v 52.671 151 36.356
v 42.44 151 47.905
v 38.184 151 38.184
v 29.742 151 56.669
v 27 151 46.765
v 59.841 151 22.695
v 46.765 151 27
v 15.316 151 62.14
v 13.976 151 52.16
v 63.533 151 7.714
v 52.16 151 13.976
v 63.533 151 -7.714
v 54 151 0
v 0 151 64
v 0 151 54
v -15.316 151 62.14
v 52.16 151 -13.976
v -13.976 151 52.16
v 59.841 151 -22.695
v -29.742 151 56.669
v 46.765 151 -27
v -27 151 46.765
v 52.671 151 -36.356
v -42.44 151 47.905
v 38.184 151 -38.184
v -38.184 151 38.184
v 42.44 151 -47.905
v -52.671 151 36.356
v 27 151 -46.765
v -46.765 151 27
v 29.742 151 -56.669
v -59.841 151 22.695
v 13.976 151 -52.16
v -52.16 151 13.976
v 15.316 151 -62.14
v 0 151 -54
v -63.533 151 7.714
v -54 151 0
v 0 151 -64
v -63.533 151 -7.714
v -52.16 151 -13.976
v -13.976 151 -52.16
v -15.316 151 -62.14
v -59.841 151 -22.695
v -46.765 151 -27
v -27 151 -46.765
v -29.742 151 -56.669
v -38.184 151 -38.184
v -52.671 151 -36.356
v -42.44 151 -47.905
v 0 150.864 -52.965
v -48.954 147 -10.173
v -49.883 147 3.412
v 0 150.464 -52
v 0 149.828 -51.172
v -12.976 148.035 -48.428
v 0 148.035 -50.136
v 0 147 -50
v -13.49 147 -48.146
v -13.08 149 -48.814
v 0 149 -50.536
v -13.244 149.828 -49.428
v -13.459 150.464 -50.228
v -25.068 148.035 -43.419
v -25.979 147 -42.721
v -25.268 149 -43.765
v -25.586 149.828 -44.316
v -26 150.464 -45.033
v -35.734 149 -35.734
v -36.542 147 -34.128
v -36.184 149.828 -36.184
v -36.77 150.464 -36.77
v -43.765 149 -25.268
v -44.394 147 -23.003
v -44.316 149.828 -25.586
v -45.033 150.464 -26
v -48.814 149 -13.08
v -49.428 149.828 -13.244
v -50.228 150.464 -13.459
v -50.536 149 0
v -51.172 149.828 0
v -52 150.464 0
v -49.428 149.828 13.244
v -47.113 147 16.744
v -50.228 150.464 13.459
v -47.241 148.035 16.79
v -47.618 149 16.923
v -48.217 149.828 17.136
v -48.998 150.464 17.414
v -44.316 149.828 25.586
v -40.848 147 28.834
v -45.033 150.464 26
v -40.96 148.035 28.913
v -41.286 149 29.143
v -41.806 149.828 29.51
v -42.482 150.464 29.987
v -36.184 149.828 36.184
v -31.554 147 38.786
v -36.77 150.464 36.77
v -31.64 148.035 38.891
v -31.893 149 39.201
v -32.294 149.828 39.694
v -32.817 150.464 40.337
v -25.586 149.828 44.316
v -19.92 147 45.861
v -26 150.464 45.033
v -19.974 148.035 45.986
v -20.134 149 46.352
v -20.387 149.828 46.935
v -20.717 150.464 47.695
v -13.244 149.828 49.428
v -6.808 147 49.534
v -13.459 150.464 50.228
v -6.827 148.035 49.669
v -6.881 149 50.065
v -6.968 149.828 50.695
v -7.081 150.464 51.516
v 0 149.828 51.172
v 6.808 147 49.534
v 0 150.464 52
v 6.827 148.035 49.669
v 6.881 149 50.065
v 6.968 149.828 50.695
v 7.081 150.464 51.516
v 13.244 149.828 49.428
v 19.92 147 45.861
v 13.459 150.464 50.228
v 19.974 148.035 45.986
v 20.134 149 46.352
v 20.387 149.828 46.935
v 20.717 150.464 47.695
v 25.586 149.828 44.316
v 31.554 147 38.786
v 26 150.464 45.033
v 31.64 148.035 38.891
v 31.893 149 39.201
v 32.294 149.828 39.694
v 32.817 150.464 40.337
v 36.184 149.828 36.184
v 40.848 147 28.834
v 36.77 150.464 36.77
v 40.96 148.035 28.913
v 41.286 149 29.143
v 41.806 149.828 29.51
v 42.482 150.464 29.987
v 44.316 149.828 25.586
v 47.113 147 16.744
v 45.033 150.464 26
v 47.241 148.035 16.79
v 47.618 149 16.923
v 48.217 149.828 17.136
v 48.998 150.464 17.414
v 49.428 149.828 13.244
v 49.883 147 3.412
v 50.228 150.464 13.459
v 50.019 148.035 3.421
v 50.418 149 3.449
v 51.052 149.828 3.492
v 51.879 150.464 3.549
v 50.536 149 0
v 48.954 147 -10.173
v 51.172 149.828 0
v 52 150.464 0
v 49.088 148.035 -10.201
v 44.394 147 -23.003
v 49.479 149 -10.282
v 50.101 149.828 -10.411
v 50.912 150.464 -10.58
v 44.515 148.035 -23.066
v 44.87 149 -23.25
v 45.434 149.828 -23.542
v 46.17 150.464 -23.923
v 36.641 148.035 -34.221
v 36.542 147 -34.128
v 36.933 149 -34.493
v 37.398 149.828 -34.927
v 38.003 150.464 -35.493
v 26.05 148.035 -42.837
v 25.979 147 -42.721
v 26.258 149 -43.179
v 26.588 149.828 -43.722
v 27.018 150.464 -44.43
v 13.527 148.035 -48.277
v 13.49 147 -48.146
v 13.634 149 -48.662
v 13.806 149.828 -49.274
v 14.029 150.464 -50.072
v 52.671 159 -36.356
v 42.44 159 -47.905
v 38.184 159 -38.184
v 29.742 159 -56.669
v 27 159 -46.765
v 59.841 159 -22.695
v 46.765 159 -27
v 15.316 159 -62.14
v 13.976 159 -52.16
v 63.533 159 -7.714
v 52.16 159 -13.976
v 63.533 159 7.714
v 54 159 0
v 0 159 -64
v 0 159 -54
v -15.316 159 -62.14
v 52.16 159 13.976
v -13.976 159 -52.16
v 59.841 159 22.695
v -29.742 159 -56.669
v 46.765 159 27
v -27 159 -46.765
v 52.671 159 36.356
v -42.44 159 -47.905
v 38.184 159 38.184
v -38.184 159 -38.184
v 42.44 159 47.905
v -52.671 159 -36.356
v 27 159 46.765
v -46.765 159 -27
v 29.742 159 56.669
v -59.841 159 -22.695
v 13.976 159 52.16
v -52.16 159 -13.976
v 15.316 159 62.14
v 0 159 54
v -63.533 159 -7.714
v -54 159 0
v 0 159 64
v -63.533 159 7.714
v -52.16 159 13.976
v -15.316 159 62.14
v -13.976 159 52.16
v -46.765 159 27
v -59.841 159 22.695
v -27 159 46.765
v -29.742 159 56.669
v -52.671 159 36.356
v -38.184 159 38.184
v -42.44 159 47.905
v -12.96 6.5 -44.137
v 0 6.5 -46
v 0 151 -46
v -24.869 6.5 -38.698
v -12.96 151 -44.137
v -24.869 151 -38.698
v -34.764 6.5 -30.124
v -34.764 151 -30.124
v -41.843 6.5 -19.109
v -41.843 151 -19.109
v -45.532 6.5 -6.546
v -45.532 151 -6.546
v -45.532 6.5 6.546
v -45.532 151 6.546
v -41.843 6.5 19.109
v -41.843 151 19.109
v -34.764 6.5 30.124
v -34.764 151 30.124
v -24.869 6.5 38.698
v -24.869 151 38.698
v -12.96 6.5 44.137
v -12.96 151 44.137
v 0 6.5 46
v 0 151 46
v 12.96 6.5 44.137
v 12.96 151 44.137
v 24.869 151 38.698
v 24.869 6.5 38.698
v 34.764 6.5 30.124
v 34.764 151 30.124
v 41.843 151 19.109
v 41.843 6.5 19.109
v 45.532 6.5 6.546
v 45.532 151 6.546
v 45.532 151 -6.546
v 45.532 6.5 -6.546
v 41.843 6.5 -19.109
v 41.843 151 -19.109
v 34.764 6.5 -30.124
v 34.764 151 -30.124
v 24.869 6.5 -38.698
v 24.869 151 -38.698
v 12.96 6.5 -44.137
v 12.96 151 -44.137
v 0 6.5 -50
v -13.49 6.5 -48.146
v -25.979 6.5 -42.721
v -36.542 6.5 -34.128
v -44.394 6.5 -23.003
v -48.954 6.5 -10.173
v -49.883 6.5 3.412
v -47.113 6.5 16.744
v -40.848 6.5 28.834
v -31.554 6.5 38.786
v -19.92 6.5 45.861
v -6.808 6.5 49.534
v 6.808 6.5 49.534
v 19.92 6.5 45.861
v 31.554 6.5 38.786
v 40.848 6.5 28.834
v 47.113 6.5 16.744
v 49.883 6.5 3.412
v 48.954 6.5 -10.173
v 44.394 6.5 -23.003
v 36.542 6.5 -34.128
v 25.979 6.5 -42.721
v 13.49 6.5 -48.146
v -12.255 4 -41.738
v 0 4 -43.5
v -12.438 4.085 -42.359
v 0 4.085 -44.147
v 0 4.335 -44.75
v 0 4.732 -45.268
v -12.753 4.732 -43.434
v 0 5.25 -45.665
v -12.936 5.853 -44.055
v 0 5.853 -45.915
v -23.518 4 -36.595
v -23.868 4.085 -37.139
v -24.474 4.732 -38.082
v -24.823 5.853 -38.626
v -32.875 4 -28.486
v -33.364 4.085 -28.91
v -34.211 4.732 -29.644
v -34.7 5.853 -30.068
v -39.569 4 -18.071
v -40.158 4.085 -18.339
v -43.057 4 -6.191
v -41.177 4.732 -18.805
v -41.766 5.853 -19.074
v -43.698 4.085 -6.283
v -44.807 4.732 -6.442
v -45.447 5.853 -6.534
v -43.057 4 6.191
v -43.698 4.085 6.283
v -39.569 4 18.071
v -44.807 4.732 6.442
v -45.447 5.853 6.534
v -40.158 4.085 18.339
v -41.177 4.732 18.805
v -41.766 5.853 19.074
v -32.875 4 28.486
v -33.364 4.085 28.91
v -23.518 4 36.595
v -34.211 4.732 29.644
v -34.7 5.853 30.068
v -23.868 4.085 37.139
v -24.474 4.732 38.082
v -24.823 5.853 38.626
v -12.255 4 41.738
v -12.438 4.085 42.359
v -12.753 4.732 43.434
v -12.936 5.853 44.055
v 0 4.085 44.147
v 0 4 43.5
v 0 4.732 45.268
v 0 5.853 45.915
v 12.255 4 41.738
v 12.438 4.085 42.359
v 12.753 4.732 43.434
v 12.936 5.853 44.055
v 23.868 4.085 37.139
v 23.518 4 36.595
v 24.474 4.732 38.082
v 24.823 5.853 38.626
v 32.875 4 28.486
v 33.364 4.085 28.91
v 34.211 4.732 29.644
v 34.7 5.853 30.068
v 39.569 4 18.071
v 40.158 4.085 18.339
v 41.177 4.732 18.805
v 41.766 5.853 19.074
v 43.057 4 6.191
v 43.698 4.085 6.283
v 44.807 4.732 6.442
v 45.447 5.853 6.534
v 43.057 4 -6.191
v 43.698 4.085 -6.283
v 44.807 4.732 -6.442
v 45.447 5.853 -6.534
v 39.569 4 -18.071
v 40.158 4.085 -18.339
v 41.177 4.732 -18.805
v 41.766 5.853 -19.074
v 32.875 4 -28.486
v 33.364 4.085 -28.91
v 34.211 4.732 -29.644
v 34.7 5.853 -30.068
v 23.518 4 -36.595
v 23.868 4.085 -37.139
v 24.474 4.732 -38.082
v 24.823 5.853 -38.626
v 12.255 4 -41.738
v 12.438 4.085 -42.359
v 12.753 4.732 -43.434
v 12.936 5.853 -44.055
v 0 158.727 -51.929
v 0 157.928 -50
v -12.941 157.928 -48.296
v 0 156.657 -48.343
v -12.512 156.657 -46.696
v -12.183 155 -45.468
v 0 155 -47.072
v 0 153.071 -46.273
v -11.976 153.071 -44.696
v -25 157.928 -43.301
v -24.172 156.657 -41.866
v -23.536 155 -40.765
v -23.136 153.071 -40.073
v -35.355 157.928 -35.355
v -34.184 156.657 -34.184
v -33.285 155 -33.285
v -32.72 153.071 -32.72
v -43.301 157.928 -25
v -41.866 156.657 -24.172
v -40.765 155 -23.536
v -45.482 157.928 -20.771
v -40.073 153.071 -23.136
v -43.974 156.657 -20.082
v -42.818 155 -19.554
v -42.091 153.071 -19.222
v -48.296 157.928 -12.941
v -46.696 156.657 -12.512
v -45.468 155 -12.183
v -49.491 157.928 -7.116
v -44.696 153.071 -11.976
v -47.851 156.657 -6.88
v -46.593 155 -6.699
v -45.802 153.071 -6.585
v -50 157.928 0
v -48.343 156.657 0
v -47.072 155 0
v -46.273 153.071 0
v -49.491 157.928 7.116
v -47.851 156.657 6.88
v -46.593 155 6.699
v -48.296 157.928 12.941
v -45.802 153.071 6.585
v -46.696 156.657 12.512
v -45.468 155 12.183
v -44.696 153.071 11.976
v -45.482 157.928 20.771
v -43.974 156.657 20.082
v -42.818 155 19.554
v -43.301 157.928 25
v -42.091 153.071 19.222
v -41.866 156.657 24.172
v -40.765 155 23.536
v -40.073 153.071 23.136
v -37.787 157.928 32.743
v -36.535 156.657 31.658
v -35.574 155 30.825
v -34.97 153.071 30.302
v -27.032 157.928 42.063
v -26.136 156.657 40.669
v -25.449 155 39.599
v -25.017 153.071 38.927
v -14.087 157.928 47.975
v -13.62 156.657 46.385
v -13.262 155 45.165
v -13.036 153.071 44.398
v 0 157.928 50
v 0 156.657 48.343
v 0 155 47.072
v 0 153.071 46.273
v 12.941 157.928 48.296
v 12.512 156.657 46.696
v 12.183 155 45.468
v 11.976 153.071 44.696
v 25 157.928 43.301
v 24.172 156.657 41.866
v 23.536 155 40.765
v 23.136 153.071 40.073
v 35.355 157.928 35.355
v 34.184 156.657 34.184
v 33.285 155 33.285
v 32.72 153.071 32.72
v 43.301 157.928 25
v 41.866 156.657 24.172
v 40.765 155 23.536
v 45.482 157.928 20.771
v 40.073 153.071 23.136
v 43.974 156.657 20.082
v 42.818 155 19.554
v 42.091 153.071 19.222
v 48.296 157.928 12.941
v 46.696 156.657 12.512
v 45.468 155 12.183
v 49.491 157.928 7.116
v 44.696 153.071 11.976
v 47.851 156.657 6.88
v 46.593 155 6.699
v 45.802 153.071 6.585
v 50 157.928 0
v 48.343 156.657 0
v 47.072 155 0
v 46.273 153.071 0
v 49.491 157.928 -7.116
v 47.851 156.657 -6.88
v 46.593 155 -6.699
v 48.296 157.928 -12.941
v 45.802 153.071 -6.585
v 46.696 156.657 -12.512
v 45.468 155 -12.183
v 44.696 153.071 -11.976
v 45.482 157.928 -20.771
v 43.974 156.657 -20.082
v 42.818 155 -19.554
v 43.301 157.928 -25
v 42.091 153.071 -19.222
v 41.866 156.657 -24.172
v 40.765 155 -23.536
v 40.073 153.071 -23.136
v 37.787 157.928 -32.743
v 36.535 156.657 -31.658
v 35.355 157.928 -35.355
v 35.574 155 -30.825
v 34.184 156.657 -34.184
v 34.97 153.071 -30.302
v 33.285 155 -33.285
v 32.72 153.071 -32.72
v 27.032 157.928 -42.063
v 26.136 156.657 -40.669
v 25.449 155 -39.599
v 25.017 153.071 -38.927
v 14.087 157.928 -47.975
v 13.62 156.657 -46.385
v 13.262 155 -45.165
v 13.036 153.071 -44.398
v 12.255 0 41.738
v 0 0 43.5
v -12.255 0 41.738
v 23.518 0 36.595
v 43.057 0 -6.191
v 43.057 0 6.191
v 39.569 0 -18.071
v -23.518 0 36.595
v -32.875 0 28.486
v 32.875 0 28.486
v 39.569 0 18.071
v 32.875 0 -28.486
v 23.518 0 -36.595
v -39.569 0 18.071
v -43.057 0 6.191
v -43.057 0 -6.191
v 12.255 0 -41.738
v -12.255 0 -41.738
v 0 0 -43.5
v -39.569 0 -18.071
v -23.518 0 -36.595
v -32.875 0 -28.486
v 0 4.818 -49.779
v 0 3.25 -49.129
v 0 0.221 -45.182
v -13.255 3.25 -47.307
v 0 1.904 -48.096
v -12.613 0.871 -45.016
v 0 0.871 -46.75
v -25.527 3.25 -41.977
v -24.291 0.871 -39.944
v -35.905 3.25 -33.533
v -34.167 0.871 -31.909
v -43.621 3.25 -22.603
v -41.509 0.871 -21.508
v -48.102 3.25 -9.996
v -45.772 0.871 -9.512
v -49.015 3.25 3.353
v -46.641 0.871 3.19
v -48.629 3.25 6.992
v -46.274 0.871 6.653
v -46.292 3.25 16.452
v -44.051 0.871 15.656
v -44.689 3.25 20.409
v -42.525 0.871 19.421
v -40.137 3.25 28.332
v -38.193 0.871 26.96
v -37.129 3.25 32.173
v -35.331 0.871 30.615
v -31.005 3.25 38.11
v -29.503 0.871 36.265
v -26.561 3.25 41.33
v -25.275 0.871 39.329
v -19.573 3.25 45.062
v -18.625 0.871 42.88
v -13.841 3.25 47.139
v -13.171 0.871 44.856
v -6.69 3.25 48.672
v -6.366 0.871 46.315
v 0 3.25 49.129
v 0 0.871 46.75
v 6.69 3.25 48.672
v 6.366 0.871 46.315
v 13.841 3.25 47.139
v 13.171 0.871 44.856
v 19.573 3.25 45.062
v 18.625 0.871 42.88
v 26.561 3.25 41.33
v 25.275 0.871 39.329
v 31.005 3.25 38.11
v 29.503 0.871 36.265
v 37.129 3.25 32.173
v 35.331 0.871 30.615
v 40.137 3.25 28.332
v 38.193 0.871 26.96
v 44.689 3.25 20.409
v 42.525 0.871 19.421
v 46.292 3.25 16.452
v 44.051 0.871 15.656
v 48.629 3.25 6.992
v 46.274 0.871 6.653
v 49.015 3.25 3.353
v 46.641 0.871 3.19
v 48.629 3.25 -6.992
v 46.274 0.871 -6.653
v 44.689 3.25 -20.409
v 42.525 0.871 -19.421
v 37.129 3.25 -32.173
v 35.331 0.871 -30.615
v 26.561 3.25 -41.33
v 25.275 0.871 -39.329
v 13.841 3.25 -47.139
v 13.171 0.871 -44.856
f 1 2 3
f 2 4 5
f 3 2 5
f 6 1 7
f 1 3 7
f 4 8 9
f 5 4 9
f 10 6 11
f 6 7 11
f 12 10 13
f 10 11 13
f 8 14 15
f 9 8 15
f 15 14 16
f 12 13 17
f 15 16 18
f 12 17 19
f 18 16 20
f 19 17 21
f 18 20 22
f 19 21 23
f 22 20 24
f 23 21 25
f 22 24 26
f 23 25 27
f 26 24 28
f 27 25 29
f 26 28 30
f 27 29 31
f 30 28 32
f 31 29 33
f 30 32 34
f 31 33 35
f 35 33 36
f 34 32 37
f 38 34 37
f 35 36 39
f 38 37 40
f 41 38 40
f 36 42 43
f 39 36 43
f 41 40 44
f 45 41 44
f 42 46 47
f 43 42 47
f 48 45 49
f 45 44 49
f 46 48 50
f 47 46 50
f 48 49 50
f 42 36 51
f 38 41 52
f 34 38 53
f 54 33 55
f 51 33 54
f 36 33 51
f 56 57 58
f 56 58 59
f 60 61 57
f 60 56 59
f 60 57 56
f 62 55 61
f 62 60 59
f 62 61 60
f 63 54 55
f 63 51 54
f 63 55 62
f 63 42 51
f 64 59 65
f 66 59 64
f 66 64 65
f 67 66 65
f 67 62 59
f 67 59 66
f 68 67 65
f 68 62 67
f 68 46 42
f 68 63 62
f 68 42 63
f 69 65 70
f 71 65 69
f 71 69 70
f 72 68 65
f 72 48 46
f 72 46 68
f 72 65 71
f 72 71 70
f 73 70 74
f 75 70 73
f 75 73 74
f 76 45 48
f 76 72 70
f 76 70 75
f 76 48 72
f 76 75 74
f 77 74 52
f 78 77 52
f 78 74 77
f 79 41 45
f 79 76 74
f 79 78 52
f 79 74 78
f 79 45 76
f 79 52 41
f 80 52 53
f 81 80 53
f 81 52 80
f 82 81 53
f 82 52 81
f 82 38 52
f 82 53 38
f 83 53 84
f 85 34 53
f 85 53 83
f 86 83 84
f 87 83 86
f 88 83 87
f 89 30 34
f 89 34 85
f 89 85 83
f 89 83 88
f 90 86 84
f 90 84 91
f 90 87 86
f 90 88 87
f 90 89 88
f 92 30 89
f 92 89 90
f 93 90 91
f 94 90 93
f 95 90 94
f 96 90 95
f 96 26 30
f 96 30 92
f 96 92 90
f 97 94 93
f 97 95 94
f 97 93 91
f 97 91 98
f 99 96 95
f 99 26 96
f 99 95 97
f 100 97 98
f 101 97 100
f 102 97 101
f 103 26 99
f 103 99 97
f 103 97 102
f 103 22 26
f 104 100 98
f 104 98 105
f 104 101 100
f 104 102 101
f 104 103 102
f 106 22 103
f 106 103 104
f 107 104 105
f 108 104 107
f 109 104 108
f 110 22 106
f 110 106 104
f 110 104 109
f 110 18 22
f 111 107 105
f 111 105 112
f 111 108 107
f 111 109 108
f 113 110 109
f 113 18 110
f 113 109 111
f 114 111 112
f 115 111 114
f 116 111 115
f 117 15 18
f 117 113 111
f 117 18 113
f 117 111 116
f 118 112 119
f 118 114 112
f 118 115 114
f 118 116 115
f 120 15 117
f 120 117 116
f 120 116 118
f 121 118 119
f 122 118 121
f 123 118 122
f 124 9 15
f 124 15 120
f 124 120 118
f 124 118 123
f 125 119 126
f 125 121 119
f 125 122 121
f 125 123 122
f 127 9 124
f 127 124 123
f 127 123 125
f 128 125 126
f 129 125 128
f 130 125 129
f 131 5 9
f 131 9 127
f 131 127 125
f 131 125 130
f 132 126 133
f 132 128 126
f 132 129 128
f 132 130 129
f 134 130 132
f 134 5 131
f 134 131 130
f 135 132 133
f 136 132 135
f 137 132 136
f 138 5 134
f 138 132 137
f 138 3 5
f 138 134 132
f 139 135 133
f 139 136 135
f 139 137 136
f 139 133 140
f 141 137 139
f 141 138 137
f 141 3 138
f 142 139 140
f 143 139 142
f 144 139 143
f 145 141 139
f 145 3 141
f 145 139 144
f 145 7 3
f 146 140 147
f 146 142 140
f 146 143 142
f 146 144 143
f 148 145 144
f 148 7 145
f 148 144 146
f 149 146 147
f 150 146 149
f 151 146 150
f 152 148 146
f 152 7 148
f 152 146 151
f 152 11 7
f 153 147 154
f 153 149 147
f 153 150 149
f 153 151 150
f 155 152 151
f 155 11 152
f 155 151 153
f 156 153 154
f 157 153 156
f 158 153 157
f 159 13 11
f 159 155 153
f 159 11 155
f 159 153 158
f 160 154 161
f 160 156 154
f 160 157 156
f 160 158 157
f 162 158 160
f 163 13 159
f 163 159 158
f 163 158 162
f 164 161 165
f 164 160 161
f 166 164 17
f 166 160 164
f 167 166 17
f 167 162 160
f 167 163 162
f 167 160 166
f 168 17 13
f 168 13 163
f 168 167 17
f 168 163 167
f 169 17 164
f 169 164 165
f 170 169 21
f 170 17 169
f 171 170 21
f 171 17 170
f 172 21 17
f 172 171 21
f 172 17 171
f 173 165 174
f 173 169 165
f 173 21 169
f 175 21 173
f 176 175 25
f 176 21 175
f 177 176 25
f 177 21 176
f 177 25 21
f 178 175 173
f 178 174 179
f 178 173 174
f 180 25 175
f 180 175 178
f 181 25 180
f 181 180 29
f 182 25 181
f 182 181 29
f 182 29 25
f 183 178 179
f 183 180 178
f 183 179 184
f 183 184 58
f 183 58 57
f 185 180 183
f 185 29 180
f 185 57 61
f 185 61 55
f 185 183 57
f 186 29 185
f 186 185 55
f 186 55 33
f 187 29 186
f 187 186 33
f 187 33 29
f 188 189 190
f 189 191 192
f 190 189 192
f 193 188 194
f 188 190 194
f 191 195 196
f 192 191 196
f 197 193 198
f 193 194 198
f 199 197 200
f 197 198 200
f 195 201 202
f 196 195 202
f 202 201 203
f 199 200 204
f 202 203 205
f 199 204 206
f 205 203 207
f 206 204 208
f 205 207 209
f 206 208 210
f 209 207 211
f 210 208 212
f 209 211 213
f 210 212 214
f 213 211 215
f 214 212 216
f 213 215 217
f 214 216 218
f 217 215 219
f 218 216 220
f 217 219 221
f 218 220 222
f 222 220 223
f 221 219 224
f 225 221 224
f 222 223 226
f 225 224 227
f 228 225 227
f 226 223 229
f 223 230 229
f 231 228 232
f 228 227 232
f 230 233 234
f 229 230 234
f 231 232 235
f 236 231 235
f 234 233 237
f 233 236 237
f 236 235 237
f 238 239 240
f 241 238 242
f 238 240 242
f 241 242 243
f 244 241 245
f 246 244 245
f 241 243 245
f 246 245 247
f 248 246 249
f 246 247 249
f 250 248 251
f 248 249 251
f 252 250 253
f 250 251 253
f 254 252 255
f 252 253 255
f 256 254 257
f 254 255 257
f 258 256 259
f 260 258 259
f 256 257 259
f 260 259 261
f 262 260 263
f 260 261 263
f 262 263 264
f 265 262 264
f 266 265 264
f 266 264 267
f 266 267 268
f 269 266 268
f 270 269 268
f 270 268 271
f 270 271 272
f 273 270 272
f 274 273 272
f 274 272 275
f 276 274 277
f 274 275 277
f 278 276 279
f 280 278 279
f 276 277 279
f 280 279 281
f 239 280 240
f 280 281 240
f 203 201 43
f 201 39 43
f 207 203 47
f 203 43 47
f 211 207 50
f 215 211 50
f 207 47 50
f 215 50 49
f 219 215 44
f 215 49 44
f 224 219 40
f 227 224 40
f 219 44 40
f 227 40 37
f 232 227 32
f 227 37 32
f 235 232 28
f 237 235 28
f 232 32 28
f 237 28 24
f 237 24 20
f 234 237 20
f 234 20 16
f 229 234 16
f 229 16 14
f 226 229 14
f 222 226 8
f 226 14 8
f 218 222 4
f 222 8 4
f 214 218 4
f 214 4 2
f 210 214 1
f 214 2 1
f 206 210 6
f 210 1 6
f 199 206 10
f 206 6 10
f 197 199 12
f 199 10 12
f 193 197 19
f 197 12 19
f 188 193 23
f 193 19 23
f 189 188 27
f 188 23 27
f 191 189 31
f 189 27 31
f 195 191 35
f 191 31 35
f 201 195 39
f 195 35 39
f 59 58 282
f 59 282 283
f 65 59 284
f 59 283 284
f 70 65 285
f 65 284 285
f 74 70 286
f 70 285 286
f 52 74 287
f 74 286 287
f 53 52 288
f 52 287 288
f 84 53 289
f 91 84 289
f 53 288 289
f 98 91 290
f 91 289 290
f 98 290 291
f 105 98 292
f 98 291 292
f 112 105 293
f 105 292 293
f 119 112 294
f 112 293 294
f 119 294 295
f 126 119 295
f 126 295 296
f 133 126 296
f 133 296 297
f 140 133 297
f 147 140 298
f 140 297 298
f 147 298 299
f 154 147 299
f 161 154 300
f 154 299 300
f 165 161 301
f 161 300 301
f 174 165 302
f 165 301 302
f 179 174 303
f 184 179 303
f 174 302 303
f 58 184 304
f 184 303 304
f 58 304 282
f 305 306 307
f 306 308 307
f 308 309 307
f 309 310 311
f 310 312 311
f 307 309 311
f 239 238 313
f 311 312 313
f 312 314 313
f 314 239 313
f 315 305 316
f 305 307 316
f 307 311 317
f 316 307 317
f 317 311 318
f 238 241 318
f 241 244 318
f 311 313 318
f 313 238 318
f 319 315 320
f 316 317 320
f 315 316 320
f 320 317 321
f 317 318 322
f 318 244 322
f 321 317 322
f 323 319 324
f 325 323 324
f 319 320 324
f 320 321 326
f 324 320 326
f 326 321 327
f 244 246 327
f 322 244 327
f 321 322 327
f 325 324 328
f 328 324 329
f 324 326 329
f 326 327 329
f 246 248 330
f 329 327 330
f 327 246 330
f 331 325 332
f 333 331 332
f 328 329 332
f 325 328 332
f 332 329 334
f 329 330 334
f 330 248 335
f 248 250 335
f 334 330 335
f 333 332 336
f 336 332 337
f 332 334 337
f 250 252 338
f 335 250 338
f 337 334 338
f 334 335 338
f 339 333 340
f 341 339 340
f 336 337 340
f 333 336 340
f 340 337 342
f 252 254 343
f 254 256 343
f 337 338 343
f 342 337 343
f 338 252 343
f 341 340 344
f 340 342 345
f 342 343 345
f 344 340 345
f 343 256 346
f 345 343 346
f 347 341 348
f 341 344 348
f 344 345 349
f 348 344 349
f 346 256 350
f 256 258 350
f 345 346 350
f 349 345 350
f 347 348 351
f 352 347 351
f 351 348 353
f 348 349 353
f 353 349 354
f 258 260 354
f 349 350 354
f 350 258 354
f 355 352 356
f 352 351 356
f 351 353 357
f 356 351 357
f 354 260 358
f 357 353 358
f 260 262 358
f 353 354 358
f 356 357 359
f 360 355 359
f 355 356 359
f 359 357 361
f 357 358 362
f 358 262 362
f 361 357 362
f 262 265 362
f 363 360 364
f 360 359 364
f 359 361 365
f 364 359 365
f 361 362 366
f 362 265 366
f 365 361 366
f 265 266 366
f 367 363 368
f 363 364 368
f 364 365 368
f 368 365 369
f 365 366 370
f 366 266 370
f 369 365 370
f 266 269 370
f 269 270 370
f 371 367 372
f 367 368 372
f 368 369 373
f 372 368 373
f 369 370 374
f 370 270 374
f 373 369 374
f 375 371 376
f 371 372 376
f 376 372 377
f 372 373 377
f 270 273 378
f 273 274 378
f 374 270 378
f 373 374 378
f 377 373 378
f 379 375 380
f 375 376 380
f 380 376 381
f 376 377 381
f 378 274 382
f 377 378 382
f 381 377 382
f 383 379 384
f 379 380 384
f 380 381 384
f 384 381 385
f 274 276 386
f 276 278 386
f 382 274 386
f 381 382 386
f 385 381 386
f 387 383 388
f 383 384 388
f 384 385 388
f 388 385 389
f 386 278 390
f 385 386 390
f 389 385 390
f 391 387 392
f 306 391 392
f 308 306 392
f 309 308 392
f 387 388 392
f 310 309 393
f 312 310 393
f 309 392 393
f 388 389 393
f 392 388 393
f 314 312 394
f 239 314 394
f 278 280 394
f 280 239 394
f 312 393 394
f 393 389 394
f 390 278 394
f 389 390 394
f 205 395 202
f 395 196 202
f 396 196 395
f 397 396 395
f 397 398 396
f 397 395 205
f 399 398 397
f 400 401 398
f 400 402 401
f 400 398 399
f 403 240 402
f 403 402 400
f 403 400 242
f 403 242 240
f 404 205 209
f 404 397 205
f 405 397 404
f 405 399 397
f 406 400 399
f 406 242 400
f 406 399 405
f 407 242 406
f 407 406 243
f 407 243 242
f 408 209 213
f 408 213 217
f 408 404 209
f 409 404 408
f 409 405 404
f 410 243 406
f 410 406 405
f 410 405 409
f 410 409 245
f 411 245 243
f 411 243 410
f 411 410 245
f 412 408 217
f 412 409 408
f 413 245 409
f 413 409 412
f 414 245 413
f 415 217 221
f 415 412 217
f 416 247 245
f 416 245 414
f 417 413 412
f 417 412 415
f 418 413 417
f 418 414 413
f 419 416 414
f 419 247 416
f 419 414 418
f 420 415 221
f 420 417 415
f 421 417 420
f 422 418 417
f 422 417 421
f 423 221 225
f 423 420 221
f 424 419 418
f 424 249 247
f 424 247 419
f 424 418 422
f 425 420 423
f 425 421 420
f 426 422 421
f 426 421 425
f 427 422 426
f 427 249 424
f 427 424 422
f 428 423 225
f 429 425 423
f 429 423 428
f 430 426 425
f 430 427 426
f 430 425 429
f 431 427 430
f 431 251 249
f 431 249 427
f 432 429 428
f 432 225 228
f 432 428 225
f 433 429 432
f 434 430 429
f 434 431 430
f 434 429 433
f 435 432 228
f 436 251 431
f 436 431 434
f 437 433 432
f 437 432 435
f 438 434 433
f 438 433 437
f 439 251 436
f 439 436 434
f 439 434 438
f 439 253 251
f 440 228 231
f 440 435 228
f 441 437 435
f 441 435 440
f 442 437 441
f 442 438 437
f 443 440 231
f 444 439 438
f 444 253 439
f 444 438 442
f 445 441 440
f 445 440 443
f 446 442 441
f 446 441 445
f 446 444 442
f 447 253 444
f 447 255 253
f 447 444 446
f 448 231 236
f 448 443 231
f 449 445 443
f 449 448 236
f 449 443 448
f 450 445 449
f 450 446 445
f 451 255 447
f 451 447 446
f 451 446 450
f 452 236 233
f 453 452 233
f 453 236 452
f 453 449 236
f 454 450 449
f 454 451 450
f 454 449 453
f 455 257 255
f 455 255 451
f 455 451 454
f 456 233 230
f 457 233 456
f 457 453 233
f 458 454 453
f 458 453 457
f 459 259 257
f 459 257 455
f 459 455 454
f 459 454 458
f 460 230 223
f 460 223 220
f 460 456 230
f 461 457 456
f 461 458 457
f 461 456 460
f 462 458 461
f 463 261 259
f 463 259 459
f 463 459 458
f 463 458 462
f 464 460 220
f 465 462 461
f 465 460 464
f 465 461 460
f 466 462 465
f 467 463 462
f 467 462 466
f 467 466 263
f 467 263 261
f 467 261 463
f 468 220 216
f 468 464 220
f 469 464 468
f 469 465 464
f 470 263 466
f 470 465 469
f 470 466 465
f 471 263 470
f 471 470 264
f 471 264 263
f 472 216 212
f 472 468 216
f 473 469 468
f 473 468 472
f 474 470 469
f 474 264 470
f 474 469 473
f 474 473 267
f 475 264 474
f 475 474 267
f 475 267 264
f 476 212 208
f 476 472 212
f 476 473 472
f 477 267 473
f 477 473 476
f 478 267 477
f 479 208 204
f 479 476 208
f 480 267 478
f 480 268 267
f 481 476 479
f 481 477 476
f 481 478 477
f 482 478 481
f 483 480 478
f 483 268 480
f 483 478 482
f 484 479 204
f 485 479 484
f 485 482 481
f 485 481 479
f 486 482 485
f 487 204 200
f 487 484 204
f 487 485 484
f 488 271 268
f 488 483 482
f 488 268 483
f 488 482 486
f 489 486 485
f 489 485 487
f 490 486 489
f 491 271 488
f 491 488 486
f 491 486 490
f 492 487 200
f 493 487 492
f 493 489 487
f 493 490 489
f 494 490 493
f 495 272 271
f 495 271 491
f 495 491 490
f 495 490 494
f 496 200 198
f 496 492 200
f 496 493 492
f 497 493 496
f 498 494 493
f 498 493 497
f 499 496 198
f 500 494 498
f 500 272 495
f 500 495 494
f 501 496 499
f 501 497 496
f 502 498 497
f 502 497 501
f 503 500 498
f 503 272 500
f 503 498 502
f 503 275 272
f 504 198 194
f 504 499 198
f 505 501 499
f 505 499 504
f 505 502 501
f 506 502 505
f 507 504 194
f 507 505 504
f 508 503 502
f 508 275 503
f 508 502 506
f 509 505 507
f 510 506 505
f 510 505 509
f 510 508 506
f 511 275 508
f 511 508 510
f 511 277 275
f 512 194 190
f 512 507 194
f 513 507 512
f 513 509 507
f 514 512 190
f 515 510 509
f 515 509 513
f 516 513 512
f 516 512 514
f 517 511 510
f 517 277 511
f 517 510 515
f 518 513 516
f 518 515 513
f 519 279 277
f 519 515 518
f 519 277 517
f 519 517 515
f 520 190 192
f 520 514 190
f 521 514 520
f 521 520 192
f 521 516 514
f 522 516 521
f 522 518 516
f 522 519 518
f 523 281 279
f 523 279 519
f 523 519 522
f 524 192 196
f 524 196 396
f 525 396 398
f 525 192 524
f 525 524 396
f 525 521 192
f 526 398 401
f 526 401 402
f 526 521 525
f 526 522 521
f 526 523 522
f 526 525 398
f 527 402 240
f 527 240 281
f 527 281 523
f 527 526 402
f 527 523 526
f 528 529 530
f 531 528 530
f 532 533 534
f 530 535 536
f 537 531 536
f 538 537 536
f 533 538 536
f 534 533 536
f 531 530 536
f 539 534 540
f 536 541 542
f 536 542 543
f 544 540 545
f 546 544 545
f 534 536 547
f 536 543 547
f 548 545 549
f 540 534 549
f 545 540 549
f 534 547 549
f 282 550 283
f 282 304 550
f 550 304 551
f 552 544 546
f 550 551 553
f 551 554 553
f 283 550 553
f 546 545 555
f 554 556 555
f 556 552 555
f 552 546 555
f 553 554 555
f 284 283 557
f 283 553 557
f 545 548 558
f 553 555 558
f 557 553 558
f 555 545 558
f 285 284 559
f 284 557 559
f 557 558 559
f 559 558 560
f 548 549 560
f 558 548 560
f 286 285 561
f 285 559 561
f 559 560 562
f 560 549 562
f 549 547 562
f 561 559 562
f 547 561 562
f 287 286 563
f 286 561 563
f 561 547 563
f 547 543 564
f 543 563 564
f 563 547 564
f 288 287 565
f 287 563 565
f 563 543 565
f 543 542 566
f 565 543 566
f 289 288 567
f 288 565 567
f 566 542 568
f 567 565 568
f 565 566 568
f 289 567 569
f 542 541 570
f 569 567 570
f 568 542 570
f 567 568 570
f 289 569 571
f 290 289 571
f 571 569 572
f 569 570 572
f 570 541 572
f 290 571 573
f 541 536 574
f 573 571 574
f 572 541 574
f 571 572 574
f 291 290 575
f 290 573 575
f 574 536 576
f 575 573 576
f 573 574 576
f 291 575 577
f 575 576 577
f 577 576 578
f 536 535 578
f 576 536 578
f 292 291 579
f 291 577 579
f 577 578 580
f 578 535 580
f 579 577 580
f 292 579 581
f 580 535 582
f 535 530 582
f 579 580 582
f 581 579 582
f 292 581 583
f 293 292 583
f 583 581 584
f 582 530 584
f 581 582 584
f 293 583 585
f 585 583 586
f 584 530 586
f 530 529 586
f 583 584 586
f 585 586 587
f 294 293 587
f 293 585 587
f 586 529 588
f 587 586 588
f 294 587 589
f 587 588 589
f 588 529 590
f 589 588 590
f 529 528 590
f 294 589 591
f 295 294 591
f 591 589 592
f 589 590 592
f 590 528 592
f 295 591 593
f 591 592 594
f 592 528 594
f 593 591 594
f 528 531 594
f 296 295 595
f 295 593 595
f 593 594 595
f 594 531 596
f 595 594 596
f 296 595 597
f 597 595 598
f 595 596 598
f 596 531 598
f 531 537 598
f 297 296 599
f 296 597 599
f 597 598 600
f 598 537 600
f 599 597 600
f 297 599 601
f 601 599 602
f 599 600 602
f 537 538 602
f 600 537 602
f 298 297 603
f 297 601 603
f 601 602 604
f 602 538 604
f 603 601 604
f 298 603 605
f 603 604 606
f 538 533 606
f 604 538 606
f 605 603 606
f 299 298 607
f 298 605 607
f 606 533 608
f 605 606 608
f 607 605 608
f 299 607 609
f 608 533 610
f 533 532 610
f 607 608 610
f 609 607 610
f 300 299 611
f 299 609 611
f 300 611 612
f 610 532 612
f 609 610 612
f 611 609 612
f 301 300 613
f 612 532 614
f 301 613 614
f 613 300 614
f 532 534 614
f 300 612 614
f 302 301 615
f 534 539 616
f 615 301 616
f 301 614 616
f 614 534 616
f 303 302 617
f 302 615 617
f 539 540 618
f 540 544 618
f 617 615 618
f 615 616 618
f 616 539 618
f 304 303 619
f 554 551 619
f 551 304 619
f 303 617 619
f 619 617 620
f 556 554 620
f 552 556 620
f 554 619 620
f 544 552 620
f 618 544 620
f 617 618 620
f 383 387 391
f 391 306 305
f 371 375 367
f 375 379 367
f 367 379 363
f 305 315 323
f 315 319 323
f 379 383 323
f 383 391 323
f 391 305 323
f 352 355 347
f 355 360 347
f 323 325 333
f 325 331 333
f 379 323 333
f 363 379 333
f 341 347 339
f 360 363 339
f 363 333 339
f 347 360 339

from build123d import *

# Parameters (mm, degrees)
FILLET1_R = 4
FILLET2_R = 8


with BuildPart() as part:
    # Sketch1 → Revolve1 (revolve)
    with BuildSketch(Plane.XY, mode=Mode.PRIVATE) as revolve1_sk:
        with BuildLine():
            Line((50, 151), (50, 6.5))
            ThreePointArc((50, 6.5), (48.096194078, 1.903805922), (43.5, 0))
            Line((43.5, 0), (0, 0))
            Line((0, 0), (0, 4))
            Line((0, 4), (43.5, 4))
            ThreePointArc((43.5, 4), (45.267766953, 4.732233047), (46, 6.5))
            Line((46, 6.5), (46, 159))
            Line((46, 159), (64, 159))
            Line((64, 159), (64, 151))
            Line((64, 151), (50, 151))
        make_face()
    revolve(revolve1_sk.sketch.rotate(Axis((0, 0, 0), (0, 1, 0)), 90), axis=Axis((0, 0, 0), (0, 1, 0)))

    # Fillet1
    fillet1_edges = [part.edges().sort_by_distance(p)[0] for p in [
        (0, 151, 50),
    ]]
    fillet(fillet1_edges, radius=FILLET1_R)

    # Fillet2
    fillet2_edges = [part.edges().sort_by_distance(p)[0] for p in [
        (0, 159, 46),
    ]]
    fillet(fillet2_edges, radius=FILLET2_R)


solid = part.part
